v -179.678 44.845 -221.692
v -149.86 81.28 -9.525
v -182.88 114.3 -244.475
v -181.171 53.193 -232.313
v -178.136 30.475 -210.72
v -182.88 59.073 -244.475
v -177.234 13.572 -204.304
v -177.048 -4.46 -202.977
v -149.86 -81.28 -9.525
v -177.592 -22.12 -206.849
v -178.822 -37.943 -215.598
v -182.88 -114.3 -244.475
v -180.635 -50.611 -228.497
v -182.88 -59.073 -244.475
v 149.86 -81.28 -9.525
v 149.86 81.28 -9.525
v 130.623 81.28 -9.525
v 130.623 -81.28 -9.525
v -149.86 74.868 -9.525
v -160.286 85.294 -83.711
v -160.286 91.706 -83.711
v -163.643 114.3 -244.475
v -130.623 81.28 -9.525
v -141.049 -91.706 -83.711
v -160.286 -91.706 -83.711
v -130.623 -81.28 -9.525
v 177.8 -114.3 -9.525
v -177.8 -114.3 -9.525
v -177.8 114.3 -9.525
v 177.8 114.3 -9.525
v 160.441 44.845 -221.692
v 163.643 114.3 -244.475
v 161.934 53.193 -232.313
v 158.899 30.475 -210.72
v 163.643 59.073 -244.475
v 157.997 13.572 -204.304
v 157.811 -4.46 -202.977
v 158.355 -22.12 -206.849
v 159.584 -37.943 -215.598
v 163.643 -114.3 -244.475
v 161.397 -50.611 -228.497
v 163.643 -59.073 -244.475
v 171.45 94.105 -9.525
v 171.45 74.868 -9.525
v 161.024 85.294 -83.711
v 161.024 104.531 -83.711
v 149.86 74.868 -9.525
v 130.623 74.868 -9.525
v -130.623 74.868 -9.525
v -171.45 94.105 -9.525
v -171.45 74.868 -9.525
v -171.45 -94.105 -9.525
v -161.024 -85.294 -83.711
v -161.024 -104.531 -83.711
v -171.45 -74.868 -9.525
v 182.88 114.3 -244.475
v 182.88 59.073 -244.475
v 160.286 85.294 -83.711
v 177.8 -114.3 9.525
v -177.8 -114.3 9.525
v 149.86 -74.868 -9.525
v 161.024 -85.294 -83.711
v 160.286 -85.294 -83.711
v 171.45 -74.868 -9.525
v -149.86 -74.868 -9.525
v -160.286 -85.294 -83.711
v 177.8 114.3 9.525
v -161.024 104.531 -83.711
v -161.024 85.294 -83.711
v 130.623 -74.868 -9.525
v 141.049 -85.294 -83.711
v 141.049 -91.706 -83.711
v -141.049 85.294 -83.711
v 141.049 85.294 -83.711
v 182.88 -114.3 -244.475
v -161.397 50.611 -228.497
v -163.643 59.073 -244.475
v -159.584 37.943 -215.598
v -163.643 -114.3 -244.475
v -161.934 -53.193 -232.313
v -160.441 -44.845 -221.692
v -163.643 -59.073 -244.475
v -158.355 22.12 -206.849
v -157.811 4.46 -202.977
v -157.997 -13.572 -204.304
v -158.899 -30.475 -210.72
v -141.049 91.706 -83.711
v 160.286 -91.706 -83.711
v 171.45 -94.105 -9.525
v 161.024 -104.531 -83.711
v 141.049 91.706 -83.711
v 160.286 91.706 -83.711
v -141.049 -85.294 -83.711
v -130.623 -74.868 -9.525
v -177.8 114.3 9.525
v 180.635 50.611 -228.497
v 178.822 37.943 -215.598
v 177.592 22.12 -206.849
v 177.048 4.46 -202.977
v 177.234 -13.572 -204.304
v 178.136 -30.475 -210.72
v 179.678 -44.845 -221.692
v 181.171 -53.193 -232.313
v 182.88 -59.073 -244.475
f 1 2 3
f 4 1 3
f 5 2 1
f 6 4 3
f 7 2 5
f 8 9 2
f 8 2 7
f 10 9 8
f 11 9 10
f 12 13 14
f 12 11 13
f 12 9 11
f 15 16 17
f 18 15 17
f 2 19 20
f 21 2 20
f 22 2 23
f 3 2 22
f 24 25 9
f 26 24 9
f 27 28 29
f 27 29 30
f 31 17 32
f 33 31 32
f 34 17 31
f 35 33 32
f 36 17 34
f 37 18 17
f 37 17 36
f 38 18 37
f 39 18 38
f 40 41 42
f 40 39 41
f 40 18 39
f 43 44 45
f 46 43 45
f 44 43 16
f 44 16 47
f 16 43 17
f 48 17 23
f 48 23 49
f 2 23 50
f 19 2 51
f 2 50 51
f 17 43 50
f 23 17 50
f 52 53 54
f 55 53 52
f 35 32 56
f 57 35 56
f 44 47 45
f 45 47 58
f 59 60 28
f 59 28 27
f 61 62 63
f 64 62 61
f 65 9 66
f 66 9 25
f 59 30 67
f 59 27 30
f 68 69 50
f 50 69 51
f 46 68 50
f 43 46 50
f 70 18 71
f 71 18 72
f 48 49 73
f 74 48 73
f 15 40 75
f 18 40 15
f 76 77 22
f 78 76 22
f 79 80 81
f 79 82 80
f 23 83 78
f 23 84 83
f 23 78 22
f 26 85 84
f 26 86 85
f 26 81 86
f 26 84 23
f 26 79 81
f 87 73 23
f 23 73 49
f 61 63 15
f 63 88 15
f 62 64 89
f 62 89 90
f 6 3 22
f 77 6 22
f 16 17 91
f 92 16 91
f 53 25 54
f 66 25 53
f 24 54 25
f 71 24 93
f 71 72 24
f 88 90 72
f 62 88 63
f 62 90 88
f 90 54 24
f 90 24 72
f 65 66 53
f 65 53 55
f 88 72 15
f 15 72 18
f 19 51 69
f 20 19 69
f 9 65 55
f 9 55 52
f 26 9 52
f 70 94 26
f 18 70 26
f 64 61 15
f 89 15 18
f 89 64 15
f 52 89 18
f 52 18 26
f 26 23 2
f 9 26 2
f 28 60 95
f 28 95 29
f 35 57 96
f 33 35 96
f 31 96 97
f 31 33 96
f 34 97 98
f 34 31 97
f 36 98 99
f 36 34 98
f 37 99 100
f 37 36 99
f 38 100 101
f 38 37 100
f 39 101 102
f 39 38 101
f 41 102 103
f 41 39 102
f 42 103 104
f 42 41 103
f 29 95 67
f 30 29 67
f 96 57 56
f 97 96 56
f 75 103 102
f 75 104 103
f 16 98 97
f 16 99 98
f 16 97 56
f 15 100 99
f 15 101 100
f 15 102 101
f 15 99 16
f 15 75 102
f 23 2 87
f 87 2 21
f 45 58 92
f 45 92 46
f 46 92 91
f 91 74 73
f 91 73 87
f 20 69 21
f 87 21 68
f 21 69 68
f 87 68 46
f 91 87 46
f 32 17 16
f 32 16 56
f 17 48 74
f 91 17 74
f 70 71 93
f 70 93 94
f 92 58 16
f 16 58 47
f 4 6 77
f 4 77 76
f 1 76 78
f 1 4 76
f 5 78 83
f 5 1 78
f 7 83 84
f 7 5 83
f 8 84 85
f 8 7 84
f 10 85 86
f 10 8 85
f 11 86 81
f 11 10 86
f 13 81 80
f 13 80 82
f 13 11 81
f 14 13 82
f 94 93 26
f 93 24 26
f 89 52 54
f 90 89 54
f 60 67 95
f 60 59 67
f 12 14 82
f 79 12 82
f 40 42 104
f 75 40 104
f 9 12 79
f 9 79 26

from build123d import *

# Parameters (mm, degrees)
F1_DEPTH      = 114.3
F2_DEPTH      = 114.3
F2_DEPTH_BACK = 114.3
F4_DEPTH      = 182.881
F4_DEPTH_BACK = 182.881
F6_DEPTH      = 177.8
F6_DEPTH_BACK = 177.8
F7_DEPTH      = 114.301
F7_DEPTH_BACK = 114.301
F8_DEPTH      = 177.8
F8_DEPTH_BACK = 177.8
F13_DEPTH     = 114.301
F14_DEPTH     = 114.301


# Not quite as in the source:
# - a feature names something its author has since deleted; it is built from what else it names


with BuildPart() as f1:
    # F0 (on Front) → F1 (new body, symmetric)
    with BuildSketch(Plane.XZ):
        Polygon((177.8, 9.525), (-177.8, 9.525), (-177.8, -9.525), (-171.45, -9.525), (-149.8599308867, -9.525), (-130.6227156302, -9.525), (130.6227156302, -9.525), (149.8599308867, -9.525), (171.45, -9.525), (177.8, -9.525), align=None)
    extrude(amount=F1_DEPTH, both=True)


with BuildPart() as f2:
    # F0 (on Front) → F2 (new body, two sides)
    with BuildSketch(Plane.XZ) as f2_sk:
        Polygon((-141.0489184441, -83.7112878215), (-160.2861337006, -83.7112878215), (-182.88, -244.475), (-163.6427847435, -244.475), align=None)
        Polygon((-130.6227156302, -9.525), (-149.8599308867, -9.525), (-160.2861337006, -83.7112878215), (-141.0489184441, -83.7112878215), align=None)
    extrude(amount=F2_DEPTH)
    extrude(f2_sk.sketch, amount=-F2_DEPTH_BACK)


with BuildPart() as f2b:
    # F0 (on Front) → F2, piece 2 (new body, two sides)
    with BuildSketch(Plane.XZ) as f2_2_sk:
        Polygon((182.88, -244.475), (160.2861337006, -83.7112878215), (141.0489184441, -83.7112878215), (163.6427847435, -244.475), align=None)
        Polygon((160.2861337006, -83.7112878215), (149.8599308867, -9.525), (130.6227156302, -9.525), (141.0489184441, -83.7112878215), align=None)
    extrude(amount=F2_DEPTH)
    extrude(f2_2_sk.sketch, amount=-F2_DEPTH_BACK)


with BuildPart() as f4_tool:
    # F3 (on Right) → F4 (new body, two sides)
    with BuildSketch(Plane.YZ) as f4_sk:
        Polygon((-114.3, -244.475), (-81.2799308867, -9.525), (-114.3000000004, -9.525), align=None)
        with BuildLine():
            Line((-59.0733587742, -244.475), (59.0733587742, -244.475))
            ThreePointArc((59.0733587742, -244.475), (0, -202.8182030655), (-59.0733587742, -244.475))
        make_face()
        Polygon((114.3, -244.475), (114.3, -9.525), (81.2799308867, -9.525), align=None)
    extrude(amount=-F4_DEPTH)
    extrude(f4_sk.sketch, amount=F4_DEPTH_BACK)


with BuildPart() as f2_1:
    add(f2.part)

    # F4: cut by f4_tool
    add(f4_tool.part, mode=Mode.SUBTRACT)


with BuildPart() as f2b_1:
    add(f2b.part)

    # F4: cut by f4_tool
    add(f4_tool.part, mode=Mode.SUBTRACT)


with BuildPart() as f6:
    # F5 (on Right) → F6 (new body, two sides)
    with BuildSketch(Plane.YZ) as f6_sk:
        Polygon((-91.7061337006, -83.7112878215), (-81.2799308867, -9.525), (-94.1047410577, -9.525), (-104.5309438716, -83.7112878215), align=None)
        Polygon((-74.8675258012, -9.525), (-81.2799308867, -9.525), (-91.7061337006, -83.7112878215), (-85.2937286151, -83.7112878215), align=None)
    extrude(amount=F6_DEPTH)
    extrude(f6_sk.sketch, amount=-F6_DEPTH_BACK)

    # F0 (on Front) → F7 (cut, two sides)
    with BuildSketch(Plane.XZ) as f7_sk:
        Polygon((-171.45, -9.525), (-177.8, -9.525), (-177.8, -83.7112878215), (-161.0237971861, -83.7112878215), align=None)
        Polygon((177.8, -83.7112878215), (177.8, -9.525), (171.45, -9.525), (161.0237971861, -83.7112878215), align=None)
    extrude(amount=-F7_DEPTH, mode=Mode.SUBTRACT)
    extrude(f7_sk.sketch, amount=F7_DEPTH_BACK, mode=Mode.SUBTRACT)

    # F10: cut F2
    add(f2_1.part, mode=Mode.SUBTRACT)

    # F11: cut F2b
    add(f2b_1.part, mode=Mode.SUBTRACT)


with BuildPart() as f8:
    # F5 (on Right) → F8 (new body, two sides)
    with BuildSketch(Plane.YZ) as f8_sk:
        Polygon((94.1047410577, -9.525), (81.2799308867, -9.525), (91.7061337006, -83.7112878215), (104.5309438716, -83.7112878215), align=None)
        Polygon((81.2799308867, -9.525), (74.8675258012, -9.525), (85.2937286151, -83.7112878215), (91.7061337006, -83.7112878215), align=None)
    extrude(amount=-F8_DEPTH)
    extrude(f8_sk.sketch, amount=F8_DEPTH_BACK)

    # F9: cut F2
    add(f2_1.part, mode=Mode.SUBTRACT)

    # F12: cut F2b
    add(f2b_1.part, mode=Mode.SUBTRACT)

    # F0 (on Front) → F13 (cut, through all)
    with BuildSketch(Plane.XZ):
        Polygon((177.8, -83.7112878215), (177.8, -9.525), (171.45, -9.525), (161.0237971861, -83.7112878215), align=None)
    extrude(amount=-F13_DEPTH, mode=Mode.SUBTRACT)

    # F0 (on Front) → F14 (cut, through all)
    with BuildSketch(Plane.XZ):
        Polygon((-171.45, -9.525), (-177.8, -9.525), (-177.8, -83.7112878215), (-161.0237971861, -83.7112878215), align=None)
    extrude(amount=-F14_DEPTH, mode=Mode.SUBTRACT)


solid = Compound([f1.part, f2_1.part, f2b_1.part, f6.part, f8.part])
